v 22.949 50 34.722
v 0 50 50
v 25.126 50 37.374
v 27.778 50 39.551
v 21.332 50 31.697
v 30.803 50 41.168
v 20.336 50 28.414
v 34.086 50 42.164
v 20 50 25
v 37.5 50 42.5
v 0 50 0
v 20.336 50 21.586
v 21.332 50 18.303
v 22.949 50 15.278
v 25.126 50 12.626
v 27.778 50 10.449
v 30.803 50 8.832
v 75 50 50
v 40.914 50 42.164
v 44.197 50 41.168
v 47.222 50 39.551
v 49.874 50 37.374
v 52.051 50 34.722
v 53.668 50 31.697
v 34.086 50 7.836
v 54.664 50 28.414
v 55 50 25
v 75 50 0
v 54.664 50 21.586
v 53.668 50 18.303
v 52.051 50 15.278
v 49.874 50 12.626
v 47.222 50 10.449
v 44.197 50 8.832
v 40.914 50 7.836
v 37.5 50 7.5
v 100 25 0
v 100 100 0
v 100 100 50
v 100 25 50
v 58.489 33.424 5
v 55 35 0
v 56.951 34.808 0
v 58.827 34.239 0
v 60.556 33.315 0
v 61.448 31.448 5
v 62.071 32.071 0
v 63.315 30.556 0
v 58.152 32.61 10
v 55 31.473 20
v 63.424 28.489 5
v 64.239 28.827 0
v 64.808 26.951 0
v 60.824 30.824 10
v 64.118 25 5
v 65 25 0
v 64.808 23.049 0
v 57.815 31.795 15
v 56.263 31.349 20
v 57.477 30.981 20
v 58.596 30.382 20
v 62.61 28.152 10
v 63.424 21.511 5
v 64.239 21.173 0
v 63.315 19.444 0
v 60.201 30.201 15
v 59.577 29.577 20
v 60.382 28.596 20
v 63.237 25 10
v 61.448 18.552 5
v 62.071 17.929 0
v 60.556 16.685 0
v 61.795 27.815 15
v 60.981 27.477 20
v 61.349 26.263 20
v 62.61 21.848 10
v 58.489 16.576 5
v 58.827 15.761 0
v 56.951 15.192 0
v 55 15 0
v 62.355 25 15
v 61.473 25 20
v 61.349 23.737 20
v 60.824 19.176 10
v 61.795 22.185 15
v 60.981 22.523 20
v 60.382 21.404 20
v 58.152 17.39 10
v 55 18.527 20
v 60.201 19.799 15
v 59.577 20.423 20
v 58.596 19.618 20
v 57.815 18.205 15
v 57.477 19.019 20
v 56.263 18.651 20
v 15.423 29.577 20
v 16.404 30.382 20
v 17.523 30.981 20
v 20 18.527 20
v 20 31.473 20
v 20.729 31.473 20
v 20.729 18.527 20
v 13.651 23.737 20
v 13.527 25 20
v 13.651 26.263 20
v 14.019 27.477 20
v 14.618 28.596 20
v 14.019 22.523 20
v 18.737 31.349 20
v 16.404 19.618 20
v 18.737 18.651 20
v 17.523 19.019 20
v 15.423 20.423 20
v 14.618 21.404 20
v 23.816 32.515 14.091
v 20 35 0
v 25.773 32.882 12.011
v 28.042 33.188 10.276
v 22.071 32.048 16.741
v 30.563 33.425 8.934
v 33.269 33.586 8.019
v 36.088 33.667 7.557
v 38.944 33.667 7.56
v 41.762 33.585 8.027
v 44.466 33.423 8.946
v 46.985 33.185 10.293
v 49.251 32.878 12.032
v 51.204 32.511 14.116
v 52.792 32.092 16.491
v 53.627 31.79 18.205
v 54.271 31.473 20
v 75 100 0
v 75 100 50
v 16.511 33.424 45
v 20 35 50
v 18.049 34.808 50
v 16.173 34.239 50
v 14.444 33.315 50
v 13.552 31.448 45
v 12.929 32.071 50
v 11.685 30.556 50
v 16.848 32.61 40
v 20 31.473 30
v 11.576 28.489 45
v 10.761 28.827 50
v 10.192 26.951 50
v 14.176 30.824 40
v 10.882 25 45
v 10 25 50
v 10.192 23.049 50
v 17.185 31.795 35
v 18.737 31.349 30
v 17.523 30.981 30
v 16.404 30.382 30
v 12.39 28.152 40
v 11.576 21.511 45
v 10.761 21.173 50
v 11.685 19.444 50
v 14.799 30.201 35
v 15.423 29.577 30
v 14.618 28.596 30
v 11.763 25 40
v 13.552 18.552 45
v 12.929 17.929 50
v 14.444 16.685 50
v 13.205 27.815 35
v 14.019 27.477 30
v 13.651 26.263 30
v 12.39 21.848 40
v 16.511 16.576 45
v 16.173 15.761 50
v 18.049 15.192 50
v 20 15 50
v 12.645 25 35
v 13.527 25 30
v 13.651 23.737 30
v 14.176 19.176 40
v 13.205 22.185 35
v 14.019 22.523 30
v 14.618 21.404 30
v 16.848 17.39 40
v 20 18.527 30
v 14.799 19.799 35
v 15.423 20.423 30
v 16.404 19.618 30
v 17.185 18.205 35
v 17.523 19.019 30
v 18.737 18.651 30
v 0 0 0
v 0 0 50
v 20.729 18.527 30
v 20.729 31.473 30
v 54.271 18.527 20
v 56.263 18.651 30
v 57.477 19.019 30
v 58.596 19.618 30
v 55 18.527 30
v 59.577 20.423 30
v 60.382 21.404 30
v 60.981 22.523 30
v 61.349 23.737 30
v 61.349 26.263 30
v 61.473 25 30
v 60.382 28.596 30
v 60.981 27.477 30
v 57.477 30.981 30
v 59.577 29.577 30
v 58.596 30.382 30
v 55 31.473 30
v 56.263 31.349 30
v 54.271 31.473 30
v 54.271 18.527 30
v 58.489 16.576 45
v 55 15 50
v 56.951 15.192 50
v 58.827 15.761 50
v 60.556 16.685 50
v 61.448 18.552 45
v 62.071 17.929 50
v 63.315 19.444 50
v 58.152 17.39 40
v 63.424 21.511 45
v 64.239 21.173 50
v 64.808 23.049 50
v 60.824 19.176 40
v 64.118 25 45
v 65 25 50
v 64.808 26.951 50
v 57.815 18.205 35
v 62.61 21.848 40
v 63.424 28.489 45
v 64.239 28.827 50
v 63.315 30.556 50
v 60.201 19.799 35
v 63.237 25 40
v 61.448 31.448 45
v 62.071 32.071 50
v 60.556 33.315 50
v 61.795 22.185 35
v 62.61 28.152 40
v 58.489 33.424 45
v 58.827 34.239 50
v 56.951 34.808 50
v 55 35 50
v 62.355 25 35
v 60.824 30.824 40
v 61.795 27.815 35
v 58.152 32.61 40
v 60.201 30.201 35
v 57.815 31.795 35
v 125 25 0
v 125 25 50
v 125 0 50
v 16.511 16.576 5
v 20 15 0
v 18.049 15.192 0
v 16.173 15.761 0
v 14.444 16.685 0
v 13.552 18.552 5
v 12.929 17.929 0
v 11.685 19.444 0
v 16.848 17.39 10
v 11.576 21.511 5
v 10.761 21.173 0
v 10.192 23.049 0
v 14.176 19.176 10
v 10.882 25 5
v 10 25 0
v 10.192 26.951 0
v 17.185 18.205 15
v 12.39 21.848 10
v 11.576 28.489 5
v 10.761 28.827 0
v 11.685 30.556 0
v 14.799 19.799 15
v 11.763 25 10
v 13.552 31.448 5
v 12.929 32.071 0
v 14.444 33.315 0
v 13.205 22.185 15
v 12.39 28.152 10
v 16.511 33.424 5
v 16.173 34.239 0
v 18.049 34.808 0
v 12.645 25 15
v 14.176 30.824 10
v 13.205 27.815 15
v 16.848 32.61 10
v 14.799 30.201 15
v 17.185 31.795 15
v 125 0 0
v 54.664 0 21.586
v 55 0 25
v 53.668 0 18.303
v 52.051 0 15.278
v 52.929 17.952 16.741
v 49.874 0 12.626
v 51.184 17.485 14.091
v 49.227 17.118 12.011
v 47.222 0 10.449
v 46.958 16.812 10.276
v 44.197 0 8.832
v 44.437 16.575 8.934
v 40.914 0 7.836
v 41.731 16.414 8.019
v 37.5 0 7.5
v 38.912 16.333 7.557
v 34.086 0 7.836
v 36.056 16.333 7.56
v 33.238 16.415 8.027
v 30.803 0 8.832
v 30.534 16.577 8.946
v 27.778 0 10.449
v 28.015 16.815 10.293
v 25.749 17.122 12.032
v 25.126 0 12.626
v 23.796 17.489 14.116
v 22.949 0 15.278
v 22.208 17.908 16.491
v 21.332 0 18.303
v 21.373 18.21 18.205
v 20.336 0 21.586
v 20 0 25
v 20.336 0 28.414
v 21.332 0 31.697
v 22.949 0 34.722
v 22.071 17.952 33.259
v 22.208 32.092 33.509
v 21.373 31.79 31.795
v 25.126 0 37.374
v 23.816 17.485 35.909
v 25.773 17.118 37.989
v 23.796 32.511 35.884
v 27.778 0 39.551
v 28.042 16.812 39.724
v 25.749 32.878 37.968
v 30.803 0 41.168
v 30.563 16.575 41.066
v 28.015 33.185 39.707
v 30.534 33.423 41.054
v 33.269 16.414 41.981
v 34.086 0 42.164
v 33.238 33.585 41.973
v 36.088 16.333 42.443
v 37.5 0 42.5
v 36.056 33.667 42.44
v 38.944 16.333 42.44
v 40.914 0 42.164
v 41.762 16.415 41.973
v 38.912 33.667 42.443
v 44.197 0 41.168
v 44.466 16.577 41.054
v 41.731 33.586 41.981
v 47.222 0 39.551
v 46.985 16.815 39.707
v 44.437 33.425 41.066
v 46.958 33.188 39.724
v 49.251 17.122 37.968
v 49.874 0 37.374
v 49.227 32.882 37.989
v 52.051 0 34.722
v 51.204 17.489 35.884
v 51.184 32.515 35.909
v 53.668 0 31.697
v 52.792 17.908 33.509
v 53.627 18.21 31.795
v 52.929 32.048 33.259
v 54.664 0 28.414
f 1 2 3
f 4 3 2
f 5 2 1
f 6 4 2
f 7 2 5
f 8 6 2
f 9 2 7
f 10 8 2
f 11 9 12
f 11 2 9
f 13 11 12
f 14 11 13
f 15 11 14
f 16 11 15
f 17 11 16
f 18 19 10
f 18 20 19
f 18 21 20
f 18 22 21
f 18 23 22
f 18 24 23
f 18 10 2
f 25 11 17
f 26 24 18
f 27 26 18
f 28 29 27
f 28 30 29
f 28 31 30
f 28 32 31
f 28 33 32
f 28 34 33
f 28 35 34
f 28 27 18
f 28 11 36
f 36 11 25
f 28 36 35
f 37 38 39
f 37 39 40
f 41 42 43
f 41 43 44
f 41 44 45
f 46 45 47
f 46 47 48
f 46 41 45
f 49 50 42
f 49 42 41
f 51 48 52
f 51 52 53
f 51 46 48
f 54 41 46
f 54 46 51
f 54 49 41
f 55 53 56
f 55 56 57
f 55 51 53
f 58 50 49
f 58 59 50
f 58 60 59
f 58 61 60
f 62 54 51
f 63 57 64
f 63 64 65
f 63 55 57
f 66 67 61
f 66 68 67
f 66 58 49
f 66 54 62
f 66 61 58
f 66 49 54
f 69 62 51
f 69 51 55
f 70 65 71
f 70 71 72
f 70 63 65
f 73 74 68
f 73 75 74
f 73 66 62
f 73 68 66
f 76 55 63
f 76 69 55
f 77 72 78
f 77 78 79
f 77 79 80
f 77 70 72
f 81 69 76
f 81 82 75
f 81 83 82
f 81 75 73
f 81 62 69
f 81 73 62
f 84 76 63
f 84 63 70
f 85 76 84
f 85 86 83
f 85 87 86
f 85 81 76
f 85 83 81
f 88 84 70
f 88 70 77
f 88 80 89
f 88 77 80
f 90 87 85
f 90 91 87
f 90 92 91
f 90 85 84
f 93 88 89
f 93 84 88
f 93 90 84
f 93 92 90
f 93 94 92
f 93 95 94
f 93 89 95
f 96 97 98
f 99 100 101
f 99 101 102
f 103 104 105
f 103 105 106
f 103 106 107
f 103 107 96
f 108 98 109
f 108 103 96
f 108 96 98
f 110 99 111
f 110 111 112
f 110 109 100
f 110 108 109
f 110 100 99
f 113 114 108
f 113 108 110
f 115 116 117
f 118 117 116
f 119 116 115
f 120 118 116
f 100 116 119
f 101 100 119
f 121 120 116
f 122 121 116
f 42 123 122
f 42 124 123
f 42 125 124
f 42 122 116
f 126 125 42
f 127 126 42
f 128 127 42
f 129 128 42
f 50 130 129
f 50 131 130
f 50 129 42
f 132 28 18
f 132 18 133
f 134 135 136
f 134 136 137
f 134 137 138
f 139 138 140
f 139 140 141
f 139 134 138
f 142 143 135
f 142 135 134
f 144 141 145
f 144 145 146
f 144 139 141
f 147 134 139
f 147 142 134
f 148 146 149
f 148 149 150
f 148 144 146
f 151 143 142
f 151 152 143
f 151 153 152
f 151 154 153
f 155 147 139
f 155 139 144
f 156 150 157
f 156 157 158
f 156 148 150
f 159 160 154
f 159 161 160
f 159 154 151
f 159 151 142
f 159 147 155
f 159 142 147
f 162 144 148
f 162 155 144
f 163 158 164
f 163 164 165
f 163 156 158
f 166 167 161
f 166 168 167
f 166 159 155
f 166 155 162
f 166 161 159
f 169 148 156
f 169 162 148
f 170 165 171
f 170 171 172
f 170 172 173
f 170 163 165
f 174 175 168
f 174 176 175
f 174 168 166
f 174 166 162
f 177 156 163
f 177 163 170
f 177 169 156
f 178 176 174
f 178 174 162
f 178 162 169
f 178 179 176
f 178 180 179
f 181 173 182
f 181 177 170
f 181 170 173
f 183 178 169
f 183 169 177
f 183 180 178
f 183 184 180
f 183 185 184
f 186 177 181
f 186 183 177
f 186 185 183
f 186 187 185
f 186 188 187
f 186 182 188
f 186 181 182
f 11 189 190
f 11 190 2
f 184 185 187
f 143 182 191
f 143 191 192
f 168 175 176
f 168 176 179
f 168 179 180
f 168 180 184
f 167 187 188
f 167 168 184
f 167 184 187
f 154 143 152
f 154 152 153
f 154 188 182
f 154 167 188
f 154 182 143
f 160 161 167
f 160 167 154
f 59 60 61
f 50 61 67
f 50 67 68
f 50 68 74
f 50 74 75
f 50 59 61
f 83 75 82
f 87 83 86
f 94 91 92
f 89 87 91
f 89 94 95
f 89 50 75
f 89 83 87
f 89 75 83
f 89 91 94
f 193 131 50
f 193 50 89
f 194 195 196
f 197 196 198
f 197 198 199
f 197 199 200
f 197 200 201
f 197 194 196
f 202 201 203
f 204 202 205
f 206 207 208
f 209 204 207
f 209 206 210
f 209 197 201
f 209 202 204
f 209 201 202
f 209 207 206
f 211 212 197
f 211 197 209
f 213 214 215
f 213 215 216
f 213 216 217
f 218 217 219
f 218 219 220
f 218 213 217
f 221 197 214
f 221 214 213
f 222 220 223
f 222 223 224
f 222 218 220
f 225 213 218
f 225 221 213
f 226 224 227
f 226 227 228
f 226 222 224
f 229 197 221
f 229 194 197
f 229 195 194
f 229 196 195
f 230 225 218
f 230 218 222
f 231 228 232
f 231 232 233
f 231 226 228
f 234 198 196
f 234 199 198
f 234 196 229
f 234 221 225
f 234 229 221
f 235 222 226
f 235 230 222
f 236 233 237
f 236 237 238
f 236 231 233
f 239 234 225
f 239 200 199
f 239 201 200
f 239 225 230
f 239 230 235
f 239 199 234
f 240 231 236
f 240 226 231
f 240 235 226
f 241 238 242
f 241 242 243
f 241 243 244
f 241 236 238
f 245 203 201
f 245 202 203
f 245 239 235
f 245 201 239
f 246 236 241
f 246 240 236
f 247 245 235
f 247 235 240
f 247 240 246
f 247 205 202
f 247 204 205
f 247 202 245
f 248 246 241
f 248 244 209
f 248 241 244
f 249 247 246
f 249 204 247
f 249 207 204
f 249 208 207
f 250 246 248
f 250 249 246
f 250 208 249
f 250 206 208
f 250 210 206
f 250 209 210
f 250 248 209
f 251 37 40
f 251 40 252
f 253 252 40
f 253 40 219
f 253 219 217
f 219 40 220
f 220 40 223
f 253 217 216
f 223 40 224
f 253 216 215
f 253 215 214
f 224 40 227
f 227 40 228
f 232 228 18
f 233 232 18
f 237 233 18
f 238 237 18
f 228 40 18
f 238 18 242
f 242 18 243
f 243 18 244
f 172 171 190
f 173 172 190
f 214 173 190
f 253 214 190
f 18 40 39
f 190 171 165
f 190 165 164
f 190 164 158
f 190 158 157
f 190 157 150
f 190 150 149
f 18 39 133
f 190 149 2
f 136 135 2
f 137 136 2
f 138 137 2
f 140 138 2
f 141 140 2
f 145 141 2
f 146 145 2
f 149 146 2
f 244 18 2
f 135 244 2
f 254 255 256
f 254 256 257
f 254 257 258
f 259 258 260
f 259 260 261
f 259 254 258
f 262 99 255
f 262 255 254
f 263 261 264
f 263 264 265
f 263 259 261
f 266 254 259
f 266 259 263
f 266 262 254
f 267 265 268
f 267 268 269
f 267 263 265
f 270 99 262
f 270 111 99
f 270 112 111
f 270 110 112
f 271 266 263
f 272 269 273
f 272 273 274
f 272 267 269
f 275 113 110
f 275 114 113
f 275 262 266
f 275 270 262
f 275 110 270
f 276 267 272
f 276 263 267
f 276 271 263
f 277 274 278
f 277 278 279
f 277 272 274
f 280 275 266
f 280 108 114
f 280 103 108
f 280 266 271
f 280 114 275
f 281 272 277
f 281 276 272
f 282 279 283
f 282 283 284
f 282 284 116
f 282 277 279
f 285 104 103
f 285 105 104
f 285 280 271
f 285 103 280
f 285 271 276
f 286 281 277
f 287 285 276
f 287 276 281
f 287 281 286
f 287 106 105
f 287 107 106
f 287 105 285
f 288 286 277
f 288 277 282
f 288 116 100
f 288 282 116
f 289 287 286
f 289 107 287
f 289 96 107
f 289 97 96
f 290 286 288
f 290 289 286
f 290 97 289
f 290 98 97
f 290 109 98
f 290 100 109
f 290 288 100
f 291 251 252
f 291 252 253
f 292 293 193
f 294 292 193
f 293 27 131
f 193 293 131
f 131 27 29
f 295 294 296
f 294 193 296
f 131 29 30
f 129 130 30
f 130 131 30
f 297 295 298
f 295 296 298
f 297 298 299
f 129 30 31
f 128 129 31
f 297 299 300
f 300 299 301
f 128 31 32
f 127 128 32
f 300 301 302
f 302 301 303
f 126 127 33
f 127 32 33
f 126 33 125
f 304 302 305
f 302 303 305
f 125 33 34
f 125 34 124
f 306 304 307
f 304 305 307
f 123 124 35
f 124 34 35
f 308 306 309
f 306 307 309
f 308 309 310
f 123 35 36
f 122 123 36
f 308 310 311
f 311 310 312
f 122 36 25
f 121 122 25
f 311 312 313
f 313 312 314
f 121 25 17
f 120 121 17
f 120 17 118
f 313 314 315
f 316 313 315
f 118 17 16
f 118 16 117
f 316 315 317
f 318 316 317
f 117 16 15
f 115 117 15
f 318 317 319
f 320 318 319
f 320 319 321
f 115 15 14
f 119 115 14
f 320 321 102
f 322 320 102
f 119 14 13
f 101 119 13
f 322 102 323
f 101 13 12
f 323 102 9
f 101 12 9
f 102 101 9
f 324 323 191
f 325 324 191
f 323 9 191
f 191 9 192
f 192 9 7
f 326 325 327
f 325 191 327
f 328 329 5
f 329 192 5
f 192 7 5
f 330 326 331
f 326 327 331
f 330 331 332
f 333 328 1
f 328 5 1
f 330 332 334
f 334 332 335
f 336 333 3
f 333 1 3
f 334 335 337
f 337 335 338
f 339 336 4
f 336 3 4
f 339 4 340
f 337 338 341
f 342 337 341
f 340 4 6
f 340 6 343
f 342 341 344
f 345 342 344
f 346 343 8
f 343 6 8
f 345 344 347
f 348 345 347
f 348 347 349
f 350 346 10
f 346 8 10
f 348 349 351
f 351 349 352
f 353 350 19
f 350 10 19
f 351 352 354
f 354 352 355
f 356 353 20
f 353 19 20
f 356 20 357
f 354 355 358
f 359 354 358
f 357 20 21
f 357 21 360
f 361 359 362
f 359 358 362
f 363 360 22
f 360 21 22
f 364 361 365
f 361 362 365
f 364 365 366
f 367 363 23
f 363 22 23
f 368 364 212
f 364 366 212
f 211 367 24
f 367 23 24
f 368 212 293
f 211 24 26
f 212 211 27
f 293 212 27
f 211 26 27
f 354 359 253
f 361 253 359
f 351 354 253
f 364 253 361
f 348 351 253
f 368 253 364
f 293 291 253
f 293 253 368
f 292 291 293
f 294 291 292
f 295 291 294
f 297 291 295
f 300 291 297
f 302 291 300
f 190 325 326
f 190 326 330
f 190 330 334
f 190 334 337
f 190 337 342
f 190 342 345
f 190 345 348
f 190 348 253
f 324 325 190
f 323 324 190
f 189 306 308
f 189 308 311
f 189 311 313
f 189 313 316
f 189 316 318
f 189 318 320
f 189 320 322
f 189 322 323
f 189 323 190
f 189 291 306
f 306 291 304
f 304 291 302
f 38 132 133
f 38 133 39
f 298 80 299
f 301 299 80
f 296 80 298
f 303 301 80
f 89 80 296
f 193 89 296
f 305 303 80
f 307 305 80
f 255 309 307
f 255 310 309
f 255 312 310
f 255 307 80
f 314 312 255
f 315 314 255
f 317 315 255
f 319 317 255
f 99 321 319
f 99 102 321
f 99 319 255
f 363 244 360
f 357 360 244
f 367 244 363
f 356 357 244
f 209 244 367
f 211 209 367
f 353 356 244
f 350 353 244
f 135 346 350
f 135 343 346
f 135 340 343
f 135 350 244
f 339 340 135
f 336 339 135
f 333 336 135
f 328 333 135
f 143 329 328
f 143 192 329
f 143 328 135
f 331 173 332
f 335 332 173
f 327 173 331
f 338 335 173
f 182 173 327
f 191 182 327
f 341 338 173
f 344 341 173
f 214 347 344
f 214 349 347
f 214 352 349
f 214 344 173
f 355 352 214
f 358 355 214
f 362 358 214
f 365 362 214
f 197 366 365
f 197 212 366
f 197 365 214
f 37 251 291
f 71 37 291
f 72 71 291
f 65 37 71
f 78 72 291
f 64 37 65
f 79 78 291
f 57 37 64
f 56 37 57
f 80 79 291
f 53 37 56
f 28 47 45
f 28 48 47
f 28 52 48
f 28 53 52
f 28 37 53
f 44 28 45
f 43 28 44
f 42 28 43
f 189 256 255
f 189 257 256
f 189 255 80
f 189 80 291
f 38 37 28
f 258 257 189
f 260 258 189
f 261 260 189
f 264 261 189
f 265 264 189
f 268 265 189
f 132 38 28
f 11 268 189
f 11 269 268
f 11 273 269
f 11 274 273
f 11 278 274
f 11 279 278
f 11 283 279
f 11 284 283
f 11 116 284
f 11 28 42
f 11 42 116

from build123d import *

# Parameters (mm, degrees)
BASE_EXTRUSION_DEPTH = 50
FRONT_CUT_DEPTH      = 20
FRONT_CUT_TAPER      = 10
BACK_CUT_DEPTH       = 20
BACK_CUT_TAPER       = 10
TOP_CUT_SKETCH_R     = 17.5
TOP_CUT_DEPTH        = 50


with BuildPart() as part:
    # Base Sketch → Base Extrusion (new body)
    with BuildSketch(Plane.XY):
        Polygon((0, 0), (0, 50), (75, 50), (75, 100), (100, 100), (100, 25), (125, 25), (125, 0), align=None)
    extrude(amount=BASE_EXTRUSION_DEPTH)

    # Front Cut Sketch → Front Cut (cut)
    with BuildSketch(Plane.XY.offset(50)):
        with BuildLine():
            ThreePointArc((20, 35), (10, 25), (20, 15))
            Line((20, 15), (55, 15))
            ThreePointArc((55, 15), (65, 25), (55, 35))
            Line((55, 35), (20, 35))
        make_face()
    extrude(amount=-FRONT_CUT_DEPTH, taper=FRONT_CUT_TAPER, mode=Mode.SUBTRACT)

    # Back Cut Sketch → Back Cut (cut)
    with BuildSketch(Plane(origin=(0, 0, 0), x_dir=(-1, 0, 0), z_dir=(0, 0, -1))):
        with BuildLine():
            ThreePointArc((-20, 15), (-10, 25), (-20, 35))
            Line((-20, 35), (-55, 35))
            ThreePointArc((-55, 35), (-65, 25), (-55, 15))
            Line((-55, 15), (-20, 15))
        make_face()
    extrude(amount=-BACK_CUT_DEPTH, taper=BACK_CUT_TAPER, mode=Mode.SUBTRACT)

    # Top Cut Sketch → Top Cut (cut)
    with BuildSketch(Plane(origin=(0, 50, 0), x_dir=(1, 0, 0), z_dir=(0, 1, 0))):
        with Locations((37.5, -25)):
            Circle(TOP_CUT_SKETCH_R)
    extrude(amount=-TOP_CUT_DEPTH, mode=Mode.SUBTRACT)


solid = part.part
